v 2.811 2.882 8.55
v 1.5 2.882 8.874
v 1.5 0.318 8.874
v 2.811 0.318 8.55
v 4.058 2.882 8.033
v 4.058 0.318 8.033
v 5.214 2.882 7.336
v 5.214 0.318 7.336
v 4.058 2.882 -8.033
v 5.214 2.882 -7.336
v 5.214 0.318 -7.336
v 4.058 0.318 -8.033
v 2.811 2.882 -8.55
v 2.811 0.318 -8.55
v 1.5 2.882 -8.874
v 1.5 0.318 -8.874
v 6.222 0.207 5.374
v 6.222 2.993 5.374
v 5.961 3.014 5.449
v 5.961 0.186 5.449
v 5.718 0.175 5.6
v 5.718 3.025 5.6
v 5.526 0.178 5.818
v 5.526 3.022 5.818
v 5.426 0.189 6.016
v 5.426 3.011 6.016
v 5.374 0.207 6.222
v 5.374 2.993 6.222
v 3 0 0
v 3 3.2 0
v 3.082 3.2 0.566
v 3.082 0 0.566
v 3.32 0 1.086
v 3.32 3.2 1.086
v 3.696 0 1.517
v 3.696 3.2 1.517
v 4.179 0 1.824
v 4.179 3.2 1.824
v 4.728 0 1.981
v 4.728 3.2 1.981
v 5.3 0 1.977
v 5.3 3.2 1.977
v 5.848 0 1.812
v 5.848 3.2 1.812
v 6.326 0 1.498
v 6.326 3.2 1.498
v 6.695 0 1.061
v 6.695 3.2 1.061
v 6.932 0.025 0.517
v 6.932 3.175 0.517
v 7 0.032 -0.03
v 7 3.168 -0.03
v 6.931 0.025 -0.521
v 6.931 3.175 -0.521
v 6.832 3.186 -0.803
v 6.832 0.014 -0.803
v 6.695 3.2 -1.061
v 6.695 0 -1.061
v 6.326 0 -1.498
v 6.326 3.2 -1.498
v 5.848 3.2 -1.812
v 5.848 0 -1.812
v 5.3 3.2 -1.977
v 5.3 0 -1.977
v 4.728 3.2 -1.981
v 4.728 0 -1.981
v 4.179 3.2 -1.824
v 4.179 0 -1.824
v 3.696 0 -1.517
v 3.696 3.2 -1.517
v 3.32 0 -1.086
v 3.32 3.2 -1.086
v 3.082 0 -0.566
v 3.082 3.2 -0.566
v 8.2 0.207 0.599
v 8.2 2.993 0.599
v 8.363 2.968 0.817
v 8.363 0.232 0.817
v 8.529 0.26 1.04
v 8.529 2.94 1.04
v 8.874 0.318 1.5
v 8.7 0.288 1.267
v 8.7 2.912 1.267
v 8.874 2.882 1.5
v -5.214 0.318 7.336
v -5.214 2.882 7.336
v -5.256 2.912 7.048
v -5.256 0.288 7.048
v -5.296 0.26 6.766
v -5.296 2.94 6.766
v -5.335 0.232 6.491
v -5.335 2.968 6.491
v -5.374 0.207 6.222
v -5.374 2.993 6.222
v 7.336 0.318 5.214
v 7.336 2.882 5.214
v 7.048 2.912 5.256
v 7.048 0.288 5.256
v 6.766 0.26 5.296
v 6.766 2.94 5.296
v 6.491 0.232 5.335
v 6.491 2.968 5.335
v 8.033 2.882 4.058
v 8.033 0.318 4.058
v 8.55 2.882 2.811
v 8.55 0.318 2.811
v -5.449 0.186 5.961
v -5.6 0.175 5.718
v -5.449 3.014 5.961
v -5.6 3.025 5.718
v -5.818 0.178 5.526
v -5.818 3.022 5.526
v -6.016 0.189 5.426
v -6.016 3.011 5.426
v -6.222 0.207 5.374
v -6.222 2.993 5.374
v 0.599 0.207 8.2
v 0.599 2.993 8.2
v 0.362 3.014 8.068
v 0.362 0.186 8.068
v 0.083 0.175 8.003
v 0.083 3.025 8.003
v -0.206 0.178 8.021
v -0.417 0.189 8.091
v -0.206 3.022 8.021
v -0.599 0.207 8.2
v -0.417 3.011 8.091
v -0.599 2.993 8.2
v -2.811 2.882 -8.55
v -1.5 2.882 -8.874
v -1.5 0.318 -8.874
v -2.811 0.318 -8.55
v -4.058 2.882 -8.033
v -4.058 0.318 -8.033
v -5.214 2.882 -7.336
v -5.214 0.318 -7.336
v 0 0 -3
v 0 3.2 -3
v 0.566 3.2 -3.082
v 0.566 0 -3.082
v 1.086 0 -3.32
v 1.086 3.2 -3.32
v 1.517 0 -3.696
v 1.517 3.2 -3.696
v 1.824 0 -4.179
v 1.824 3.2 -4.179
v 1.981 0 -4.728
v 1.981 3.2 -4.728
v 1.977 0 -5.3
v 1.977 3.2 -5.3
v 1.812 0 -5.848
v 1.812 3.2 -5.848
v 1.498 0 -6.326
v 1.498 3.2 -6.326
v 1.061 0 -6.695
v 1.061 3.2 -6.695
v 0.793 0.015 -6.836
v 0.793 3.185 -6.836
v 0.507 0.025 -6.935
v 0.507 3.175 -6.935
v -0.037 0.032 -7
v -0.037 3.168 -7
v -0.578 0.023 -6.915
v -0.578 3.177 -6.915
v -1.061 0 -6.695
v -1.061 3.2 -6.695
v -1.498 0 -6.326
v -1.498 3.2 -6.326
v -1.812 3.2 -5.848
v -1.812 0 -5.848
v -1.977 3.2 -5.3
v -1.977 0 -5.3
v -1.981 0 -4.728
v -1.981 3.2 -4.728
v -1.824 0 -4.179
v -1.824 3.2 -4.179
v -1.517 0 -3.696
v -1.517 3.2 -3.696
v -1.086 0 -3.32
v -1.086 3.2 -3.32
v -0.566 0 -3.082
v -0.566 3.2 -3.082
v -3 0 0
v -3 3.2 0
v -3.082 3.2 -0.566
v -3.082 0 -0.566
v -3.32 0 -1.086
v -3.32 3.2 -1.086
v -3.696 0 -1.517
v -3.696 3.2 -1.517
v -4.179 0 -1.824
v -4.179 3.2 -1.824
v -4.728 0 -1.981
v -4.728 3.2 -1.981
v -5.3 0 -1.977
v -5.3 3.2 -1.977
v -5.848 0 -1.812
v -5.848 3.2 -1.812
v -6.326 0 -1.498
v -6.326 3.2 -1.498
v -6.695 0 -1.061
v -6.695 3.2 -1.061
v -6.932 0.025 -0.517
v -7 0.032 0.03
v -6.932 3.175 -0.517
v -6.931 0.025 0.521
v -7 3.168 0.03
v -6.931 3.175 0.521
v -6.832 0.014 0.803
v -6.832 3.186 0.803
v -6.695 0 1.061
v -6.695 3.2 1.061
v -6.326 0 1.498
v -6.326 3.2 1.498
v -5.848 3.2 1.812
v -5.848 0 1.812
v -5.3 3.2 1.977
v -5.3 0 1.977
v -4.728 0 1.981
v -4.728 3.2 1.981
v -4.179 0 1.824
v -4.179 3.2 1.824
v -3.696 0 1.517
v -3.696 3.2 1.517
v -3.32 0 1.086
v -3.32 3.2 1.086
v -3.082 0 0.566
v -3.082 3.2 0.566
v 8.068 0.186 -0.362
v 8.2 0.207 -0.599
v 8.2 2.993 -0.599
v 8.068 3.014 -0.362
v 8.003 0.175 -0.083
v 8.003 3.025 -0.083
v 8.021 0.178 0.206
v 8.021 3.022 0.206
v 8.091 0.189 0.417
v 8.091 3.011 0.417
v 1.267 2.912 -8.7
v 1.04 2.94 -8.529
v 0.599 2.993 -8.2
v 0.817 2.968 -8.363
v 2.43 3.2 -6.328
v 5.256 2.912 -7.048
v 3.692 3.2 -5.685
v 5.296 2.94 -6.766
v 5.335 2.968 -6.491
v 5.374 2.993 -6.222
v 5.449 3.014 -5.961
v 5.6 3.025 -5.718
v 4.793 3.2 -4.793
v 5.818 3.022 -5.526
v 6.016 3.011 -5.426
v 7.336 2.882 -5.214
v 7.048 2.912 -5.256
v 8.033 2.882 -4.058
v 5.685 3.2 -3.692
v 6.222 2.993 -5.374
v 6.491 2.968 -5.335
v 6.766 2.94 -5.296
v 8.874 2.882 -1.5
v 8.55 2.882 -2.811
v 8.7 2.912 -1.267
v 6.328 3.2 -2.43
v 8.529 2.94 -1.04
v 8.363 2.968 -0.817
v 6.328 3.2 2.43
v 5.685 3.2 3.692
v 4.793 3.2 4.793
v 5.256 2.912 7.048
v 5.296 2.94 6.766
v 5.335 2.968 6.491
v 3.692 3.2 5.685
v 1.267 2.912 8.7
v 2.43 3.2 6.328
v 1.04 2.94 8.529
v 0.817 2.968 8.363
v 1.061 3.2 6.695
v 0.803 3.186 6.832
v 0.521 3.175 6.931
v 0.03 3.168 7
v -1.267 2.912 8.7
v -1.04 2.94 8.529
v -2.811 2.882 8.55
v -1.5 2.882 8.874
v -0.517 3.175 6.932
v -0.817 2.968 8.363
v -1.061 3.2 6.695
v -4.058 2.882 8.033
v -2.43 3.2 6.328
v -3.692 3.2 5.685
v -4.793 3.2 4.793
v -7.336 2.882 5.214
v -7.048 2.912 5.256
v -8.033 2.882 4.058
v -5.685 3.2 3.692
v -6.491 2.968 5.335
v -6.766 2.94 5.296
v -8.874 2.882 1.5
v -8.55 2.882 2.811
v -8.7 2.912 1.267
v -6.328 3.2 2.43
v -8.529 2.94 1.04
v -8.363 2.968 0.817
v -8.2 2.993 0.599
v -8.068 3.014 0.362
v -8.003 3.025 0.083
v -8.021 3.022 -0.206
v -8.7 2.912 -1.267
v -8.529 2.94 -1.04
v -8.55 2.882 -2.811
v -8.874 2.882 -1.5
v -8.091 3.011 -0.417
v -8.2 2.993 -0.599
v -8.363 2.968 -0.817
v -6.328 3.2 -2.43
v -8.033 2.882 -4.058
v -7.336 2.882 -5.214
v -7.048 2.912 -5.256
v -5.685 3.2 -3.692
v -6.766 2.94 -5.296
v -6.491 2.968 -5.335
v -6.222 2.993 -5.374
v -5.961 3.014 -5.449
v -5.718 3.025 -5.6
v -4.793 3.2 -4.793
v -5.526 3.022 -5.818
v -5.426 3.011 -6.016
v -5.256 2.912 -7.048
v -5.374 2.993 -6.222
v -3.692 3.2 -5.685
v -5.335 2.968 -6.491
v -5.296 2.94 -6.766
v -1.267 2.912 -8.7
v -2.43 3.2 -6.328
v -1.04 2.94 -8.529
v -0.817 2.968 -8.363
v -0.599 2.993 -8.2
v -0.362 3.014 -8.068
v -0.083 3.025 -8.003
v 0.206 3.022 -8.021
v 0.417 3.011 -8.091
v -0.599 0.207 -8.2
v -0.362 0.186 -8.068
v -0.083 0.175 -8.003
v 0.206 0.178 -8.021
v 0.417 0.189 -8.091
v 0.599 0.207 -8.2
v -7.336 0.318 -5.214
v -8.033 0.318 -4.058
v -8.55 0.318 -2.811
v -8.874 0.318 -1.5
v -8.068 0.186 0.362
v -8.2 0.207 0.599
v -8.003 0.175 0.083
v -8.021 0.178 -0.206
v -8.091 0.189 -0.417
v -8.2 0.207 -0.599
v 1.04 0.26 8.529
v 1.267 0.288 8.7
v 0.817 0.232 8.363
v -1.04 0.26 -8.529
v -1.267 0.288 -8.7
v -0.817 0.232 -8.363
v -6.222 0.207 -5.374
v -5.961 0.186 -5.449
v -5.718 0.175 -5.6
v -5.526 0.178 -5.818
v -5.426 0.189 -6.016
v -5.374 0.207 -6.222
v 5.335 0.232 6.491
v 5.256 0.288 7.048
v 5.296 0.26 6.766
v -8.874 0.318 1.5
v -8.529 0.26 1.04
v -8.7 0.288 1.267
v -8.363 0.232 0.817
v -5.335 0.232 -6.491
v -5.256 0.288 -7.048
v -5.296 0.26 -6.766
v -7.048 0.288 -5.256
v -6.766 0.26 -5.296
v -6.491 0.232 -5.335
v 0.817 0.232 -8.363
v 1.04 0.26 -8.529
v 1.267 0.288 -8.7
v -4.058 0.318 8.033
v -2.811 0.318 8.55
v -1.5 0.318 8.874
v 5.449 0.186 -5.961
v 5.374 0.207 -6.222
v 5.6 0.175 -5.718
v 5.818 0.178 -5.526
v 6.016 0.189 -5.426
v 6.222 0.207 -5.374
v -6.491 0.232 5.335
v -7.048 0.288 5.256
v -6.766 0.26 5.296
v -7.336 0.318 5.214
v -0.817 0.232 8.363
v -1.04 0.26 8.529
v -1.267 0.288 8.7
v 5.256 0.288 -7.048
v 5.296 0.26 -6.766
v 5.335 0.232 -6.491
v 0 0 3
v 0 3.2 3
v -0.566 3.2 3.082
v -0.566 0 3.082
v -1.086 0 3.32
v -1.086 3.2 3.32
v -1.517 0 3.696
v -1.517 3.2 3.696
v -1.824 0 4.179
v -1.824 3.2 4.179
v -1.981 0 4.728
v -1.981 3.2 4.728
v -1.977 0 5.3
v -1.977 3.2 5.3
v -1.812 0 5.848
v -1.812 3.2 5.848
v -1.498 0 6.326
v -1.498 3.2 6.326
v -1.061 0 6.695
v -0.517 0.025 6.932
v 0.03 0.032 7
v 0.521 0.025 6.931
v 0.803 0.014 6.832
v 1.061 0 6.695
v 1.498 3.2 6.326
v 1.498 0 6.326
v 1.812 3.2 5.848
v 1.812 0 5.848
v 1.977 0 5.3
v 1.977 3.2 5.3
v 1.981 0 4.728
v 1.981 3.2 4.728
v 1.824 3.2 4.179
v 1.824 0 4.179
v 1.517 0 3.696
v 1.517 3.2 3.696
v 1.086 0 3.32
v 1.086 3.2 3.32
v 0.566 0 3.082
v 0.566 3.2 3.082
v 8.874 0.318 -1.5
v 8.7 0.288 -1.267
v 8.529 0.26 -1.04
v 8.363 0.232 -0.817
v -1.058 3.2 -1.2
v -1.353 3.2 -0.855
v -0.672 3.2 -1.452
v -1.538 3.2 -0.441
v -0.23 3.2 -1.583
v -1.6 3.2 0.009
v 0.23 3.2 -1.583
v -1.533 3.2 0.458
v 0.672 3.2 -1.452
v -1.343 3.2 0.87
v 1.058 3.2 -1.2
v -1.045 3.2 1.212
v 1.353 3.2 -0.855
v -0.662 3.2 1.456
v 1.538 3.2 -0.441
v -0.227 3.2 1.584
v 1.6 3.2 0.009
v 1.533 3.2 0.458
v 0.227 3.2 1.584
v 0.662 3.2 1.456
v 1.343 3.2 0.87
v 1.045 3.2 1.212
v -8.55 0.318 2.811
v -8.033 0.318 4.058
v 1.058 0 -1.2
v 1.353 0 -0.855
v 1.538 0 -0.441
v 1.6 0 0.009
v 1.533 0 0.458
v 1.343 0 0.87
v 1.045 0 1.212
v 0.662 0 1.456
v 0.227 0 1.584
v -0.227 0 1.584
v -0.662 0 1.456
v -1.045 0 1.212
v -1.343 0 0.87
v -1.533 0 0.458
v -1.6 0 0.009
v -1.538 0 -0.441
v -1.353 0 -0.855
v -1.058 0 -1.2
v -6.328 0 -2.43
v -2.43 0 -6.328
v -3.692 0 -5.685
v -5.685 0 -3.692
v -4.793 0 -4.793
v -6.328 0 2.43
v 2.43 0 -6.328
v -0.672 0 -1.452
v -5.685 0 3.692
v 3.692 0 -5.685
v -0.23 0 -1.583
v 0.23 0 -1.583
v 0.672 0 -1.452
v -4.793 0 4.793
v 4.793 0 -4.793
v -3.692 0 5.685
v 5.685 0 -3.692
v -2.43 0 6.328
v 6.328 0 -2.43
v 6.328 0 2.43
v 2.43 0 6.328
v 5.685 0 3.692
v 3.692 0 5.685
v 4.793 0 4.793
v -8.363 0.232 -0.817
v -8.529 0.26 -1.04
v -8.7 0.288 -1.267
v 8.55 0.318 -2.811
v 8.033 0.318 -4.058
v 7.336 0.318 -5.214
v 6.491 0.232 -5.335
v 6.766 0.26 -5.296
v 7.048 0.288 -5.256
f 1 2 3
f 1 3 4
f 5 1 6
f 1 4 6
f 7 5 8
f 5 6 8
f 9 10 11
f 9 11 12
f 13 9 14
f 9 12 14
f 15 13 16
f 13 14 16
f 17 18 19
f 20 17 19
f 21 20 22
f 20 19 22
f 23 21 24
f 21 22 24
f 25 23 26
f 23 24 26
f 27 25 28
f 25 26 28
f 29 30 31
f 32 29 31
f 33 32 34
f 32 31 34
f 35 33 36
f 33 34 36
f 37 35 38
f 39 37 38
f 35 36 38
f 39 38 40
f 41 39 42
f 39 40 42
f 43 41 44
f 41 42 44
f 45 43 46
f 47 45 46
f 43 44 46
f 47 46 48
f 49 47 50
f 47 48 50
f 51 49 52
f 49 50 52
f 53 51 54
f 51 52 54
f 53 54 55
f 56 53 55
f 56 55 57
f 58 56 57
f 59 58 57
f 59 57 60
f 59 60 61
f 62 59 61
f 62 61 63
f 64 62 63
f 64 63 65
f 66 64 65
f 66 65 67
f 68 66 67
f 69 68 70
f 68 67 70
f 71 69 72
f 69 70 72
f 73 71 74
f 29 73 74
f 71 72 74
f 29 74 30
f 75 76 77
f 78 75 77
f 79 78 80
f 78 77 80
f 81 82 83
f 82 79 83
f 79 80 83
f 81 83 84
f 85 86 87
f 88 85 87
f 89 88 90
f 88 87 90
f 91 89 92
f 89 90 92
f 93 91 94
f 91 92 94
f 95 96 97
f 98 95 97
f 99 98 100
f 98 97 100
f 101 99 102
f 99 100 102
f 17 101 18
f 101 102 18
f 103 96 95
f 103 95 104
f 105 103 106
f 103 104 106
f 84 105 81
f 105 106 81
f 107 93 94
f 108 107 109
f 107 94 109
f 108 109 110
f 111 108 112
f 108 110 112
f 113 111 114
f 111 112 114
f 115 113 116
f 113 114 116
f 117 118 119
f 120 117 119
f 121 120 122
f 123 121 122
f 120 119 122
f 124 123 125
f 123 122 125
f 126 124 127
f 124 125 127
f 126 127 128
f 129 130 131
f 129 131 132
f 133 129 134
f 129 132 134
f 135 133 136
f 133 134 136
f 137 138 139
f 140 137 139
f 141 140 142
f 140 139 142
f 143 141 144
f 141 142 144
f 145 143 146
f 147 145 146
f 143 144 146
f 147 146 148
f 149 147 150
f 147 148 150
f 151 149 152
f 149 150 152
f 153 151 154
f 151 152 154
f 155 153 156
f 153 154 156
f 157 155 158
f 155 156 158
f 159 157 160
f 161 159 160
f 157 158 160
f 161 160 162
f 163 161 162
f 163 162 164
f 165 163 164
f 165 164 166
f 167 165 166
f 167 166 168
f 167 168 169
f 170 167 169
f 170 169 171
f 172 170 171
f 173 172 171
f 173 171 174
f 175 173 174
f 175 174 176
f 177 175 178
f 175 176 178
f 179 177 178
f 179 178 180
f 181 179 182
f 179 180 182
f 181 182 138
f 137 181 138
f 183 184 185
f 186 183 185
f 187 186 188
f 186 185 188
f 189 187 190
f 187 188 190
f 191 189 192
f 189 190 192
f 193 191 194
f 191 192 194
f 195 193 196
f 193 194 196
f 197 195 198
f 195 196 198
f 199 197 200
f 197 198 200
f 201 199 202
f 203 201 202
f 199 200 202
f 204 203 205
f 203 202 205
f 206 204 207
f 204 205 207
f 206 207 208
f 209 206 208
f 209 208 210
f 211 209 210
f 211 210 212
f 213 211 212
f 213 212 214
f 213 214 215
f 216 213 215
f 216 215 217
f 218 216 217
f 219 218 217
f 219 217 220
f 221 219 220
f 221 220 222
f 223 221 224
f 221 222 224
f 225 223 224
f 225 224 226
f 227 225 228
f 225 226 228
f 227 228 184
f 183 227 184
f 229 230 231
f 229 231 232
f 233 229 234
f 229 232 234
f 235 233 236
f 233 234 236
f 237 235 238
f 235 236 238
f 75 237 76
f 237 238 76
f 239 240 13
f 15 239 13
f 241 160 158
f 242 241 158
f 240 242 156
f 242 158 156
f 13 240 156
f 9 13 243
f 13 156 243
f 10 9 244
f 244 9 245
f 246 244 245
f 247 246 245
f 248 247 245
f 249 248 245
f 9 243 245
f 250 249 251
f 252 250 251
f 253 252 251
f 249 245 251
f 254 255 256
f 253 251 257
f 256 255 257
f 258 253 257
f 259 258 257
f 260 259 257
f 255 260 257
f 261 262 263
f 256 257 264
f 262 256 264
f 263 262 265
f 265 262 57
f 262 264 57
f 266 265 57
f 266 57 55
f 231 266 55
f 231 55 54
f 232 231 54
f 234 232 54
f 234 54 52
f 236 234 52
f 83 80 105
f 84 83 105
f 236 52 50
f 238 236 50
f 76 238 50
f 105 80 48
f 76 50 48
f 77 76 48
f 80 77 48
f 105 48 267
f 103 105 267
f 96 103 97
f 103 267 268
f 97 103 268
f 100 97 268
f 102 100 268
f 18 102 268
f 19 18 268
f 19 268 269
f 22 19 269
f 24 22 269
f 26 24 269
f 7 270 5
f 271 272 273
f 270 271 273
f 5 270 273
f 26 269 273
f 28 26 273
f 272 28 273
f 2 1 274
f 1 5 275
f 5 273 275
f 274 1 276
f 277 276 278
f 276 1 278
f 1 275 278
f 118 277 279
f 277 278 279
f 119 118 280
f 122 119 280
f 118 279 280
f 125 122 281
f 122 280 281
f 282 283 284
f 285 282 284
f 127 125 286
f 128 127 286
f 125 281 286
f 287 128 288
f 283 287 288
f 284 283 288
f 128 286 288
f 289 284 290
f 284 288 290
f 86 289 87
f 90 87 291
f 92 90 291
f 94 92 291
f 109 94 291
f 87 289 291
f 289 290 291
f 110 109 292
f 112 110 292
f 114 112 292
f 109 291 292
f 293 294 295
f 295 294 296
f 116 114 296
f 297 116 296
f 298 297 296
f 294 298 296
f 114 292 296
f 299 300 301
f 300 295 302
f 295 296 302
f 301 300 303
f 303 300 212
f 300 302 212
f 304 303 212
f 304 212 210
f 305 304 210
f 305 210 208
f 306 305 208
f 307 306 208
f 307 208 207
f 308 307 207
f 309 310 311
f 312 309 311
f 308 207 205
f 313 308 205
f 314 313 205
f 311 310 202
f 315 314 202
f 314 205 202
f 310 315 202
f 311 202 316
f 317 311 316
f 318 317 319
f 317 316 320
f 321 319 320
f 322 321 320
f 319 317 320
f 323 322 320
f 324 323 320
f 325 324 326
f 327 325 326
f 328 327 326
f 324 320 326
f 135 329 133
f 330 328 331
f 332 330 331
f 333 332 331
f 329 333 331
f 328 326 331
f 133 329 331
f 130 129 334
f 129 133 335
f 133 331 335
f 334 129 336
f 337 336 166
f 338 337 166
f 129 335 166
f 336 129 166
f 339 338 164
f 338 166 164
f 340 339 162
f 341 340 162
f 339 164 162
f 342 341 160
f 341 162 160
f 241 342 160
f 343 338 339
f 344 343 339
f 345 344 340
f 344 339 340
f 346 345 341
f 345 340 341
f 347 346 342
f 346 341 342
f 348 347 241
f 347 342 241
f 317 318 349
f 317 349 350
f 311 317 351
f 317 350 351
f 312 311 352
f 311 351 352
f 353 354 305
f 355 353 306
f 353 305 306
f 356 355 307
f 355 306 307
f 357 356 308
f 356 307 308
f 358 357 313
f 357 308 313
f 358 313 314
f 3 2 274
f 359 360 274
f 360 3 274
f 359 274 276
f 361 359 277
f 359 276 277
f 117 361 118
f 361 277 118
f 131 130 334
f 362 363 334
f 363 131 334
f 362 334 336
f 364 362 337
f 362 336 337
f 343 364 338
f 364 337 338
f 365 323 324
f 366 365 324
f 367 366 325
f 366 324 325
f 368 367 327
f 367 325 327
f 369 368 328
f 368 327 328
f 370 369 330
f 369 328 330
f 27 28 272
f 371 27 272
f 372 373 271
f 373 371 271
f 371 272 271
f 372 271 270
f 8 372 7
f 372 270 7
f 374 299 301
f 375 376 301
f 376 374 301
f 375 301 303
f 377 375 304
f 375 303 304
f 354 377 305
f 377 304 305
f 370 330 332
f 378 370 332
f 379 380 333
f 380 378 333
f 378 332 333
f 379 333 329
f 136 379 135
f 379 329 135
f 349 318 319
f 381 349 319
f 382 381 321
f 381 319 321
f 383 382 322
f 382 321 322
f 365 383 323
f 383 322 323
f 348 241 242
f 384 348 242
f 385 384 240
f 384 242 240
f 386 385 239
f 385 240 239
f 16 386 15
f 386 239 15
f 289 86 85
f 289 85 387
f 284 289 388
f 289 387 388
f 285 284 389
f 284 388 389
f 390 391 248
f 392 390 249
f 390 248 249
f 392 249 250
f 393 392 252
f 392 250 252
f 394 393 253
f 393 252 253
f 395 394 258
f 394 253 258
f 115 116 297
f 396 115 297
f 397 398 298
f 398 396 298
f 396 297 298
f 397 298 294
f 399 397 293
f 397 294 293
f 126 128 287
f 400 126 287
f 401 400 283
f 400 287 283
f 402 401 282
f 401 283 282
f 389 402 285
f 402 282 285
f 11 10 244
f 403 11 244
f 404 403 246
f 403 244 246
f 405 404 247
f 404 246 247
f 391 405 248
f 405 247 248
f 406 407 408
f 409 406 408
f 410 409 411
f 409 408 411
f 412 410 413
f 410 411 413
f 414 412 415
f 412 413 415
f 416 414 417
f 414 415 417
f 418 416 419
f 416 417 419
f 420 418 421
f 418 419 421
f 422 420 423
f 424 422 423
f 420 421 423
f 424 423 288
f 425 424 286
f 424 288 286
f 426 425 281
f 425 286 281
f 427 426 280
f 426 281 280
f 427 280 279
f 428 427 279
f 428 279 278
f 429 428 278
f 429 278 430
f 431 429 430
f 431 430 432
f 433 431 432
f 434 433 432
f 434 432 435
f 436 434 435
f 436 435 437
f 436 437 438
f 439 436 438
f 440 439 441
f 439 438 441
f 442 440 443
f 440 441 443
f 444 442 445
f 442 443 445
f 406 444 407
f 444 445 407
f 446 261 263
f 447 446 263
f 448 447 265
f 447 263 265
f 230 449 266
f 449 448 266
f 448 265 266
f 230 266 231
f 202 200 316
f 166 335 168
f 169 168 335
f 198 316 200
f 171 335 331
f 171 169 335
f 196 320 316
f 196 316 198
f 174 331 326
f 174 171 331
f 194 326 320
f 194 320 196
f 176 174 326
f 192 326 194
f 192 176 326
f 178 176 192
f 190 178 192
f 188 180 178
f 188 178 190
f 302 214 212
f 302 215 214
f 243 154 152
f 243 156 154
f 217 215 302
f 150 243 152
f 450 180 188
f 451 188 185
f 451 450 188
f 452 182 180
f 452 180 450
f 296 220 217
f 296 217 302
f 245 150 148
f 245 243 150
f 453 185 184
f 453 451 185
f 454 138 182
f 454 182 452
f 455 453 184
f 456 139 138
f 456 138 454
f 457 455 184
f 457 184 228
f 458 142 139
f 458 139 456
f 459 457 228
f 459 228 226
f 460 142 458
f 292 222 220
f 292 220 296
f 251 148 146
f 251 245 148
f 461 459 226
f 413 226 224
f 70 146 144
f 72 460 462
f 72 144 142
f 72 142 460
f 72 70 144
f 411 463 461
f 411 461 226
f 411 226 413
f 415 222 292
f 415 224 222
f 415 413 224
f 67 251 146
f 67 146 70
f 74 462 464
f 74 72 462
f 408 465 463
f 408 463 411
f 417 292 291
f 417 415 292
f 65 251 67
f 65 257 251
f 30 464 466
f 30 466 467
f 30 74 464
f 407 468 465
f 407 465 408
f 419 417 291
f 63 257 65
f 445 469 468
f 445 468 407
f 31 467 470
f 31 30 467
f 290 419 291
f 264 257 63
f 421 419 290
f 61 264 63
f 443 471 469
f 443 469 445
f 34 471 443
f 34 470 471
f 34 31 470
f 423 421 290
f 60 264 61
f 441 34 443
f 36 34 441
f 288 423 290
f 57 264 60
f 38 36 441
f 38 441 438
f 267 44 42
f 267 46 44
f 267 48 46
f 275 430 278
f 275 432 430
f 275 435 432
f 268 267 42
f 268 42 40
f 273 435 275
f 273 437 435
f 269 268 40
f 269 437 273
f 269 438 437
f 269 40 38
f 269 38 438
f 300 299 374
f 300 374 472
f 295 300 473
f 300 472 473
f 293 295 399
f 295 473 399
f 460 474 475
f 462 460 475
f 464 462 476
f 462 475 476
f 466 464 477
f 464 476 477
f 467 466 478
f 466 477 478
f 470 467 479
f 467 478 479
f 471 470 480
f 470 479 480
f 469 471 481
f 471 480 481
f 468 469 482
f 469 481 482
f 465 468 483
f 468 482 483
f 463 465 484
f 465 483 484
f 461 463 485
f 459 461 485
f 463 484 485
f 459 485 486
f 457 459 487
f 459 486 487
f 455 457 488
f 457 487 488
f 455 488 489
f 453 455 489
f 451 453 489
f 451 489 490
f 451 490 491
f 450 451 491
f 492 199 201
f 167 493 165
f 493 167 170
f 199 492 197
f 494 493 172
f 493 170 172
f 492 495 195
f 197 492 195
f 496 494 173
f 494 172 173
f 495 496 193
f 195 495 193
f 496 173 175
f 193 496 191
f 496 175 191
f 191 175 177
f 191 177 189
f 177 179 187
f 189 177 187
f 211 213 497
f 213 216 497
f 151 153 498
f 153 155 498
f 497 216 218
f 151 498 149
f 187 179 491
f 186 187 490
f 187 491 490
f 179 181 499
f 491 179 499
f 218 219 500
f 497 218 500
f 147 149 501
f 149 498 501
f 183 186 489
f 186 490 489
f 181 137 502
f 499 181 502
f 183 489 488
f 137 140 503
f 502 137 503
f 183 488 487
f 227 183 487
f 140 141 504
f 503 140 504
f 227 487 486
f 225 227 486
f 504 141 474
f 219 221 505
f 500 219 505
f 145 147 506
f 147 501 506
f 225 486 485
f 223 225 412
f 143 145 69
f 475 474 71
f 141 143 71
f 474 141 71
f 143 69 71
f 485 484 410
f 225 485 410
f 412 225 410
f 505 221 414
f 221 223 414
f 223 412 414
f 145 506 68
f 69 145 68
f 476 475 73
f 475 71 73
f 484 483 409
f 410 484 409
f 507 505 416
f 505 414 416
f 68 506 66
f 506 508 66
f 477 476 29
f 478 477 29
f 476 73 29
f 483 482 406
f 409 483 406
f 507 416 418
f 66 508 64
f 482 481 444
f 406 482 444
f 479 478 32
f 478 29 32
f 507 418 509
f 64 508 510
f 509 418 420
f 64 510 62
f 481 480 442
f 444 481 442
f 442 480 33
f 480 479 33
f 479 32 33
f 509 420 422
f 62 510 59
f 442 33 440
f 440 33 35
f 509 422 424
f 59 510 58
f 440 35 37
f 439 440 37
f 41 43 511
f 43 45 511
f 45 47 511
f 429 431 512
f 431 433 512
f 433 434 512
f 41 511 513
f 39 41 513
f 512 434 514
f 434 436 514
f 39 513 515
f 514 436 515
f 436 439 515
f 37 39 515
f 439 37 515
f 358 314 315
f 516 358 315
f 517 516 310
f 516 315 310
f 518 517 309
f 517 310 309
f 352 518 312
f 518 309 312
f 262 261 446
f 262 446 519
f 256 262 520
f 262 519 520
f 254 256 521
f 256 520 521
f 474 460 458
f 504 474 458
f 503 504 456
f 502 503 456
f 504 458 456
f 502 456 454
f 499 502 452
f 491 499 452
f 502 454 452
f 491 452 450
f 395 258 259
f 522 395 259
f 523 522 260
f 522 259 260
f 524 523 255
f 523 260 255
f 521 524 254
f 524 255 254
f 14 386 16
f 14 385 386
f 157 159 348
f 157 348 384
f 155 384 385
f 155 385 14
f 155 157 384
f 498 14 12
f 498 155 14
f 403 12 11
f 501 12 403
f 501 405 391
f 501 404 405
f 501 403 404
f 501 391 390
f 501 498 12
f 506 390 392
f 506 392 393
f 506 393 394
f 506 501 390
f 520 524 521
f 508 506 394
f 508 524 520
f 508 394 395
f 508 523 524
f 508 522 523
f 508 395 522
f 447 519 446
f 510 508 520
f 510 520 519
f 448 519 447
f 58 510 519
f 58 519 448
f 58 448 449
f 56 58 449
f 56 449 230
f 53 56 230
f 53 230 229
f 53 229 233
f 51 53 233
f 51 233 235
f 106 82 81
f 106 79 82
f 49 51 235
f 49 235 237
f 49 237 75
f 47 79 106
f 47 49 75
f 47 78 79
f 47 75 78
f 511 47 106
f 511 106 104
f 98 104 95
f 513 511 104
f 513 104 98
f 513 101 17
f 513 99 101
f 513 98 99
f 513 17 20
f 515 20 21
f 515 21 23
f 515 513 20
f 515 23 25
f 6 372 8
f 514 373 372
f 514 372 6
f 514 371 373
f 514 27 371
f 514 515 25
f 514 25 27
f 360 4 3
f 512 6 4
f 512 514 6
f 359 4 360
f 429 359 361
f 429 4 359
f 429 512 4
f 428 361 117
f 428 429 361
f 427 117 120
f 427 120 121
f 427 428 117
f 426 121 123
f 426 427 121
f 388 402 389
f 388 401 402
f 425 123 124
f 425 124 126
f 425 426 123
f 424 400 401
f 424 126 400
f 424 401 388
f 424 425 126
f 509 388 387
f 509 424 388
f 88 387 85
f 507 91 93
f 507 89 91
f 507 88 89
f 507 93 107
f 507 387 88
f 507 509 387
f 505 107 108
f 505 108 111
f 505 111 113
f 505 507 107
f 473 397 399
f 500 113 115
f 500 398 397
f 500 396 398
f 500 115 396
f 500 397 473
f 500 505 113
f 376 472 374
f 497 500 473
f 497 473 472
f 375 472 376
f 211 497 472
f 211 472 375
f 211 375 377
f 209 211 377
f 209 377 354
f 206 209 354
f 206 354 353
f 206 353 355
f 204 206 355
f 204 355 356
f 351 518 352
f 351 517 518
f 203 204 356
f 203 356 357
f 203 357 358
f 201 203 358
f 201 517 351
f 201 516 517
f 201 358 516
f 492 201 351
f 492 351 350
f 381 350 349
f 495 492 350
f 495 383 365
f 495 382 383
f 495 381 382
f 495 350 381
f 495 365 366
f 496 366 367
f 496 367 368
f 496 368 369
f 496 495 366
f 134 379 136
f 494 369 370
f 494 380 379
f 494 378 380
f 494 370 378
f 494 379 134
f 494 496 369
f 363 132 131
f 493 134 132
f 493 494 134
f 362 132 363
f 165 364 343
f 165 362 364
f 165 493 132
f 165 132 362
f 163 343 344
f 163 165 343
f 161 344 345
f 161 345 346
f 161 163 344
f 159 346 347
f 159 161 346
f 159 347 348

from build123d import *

# Parameters (mm, degrees)
SKETCH_1_R               = 9
EXTRUDE_1_DEPTH          = 3.2
CUT_EXTRUDE_2_REACH      = 15.124
PATTERN_CIRCULAR_1_COUNT = 8
CUT_EXTRUDE_1_REACH      = 14.951
SKETCH_3_R               = 2
PATTERN_CIRCULAR_2_COUNT = 4
CUT_EXTRUDE_3_REACH      = 14.951
SKETCH_6_R               = 1.6


with BuildPart() as part:
    # 草图1 → 凸台-拉伸1 (new body)
    with BuildSketch(Plane(origin=(0, 0, 0), x_dir=(1, 0, 0), z_dir=(0, 1, 0))):
        with Locations(Location((0, 0, 0), (0, 0, 270))):
            Circle(SKETCH_1_R)
        with BuildLine():
            Line((-1.058300524, 1.2), (1.058300524, 1.2))
            ThreePointArc((1.058300524, 1.2), (0, -1.6), (-1.058300524, 1.2))
        make_face(mode=Mode.SUBTRACT)
    extrude(amount=EXTRUDE_1_DEPTH)

    # 草图4 → 切除-拉伸2 (cut, up to next)
    with BuildSketch(Plane(origin=(0, 3.2, 0), x_dir=(1, 0, 0), z_dir=(0, 1, 0)), mode=Mode.PRIVATE) as cut_extrude_2_sk1:
        with BuildLine():
            Line((-1.5, 8.874119675), (-0.599498979, 8.19962448))
            ThreePointArc((-0.599498979, 8.19962448), (0, 8), (0.599498979, 8.19962448))
            Line((0.599498979, 8.19962448), (1.5, 8.874119675))
            ThreePointArc((1.5, 8.874119675), (0, 9), (-1.5, 8.874119675))
        make_face()
    cut_extrude_2_tool1 = extrude(cut_extrude_2_sk1.sketch, amount=-CUT_EXTRUDE_2_REACH, mode=Mode.PRIVATE) & part.part
    cut_extrude_2 = cut_extrude_2_tool1.solids().sort_by_distance((0, 3.2, -8.590322))[0]
    add(cut_extrude_2, mode=Mode.SUBTRACT)

    # 阵列(圆周)1: 切除-拉伸2 ×8 about axis
    pattern_circular_1_axis = Axis((0, 0, 0), (0, 1, 0))
    for i in range(1, PATTERN_CIRCULAR_1_COUNT):
        add(cut_extrude_2.rotate(pattern_circular_1_axis, i * 360 / PATTERN_CIRCULAR_1_COUNT), mode=Mode.SUBTRACT)

    # 草图3 → 切除-拉伸1 (cut, up to next)
    with BuildSketch(Plane(origin=(0, 3.2, 0), x_dir=(1, 0, 0), z_dir=(0, 1, 0)), mode=Mode.PRIVATE) as cut_extrude_1_sk1:
        with Locations(Location((0, 5, 0), (0, 0, 270))):
            Circle(SKETCH_3_R)
    cut_extrude_1_tool1 = extrude(cut_extrude_1_sk1.sketch, amount=-CUT_EXTRUDE_1_REACH, mode=Mode.PRIVATE) & part.part
    cut_extrude_1 = cut_extrude_1_tool1.solids().sort_by_distance((0, 3.2, -5))[0]
    add(cut_extrude_1, mode=Mode.SUBTRACT)

    # 阵列(圆周)2: 切除-拉伸1 ×4 about axis
    pattern_circular_2_axis = Axis((0, 0, 0), (0, 1, 0))
    for i in range(1, PATTERN_CIRCULAR_2_COUNT):
        add(cut_extrude_1.rotate(pattern_circular_2_axis, i * 360 / PATTERN_CIRCULAR_2_COUNT), mode=Mode.SUBTRACT)

    # 草图5 → 切除-旋转1 (revolve, cut)
    with BuildSketch(Plane(origin=(0, 0, 0), x_dir=(0, 0, -1), z_dir=(1, 0, 0)), mode=Mode.PRIVATE) as cut_revolve_1_sk:
        Polygon((9.374119675, 2.82841307), (6.778765119, 3.2), (9.374119675, 3.2), align=None)
    cut_revolve_1 = revolve(cut_revolve_1_sk.sketch.rotate(Axis((0, 3.2, 0), (0, -1, 0)), 4.181624795), axis=Axis((0, 3.2, 0), (0, -1, 0)), mode=Mode.SUBTRACT)

    # 镜向1: 切除-旋转1 across plane
    add(cut_revolve_1.mirror(Plane.ZX.offset(1.6)), mode=Mode.SUBTRACT)

    # 草图6 → 切除-拉伸3 (cut, up to next)
    with BuildSketch(Plane(origin=(0, 3.2, 0), x_dir=(1, 0, 0), z_dir=(0, 1, 0)), mode=Mode.PRIVATE) as cut_extrude_3_sk1:
        with Locations(Location((0, 0, 0), (0, 0, 270))):
            Circle(SKETCH_6_R)
    cut_extrude_3_tool1 = extrude(cut_extrude_3_sk1.sketch, amount=-CUT_EXTRUDE_3_REACH, mode=Mode.PRIVATE) & part.part
    add(cut_extrude_3_tool1.solids().sort_by_distance((0, 3.2, 0))[0], mode=Mode.SUBTRACT)


solid = part.part
